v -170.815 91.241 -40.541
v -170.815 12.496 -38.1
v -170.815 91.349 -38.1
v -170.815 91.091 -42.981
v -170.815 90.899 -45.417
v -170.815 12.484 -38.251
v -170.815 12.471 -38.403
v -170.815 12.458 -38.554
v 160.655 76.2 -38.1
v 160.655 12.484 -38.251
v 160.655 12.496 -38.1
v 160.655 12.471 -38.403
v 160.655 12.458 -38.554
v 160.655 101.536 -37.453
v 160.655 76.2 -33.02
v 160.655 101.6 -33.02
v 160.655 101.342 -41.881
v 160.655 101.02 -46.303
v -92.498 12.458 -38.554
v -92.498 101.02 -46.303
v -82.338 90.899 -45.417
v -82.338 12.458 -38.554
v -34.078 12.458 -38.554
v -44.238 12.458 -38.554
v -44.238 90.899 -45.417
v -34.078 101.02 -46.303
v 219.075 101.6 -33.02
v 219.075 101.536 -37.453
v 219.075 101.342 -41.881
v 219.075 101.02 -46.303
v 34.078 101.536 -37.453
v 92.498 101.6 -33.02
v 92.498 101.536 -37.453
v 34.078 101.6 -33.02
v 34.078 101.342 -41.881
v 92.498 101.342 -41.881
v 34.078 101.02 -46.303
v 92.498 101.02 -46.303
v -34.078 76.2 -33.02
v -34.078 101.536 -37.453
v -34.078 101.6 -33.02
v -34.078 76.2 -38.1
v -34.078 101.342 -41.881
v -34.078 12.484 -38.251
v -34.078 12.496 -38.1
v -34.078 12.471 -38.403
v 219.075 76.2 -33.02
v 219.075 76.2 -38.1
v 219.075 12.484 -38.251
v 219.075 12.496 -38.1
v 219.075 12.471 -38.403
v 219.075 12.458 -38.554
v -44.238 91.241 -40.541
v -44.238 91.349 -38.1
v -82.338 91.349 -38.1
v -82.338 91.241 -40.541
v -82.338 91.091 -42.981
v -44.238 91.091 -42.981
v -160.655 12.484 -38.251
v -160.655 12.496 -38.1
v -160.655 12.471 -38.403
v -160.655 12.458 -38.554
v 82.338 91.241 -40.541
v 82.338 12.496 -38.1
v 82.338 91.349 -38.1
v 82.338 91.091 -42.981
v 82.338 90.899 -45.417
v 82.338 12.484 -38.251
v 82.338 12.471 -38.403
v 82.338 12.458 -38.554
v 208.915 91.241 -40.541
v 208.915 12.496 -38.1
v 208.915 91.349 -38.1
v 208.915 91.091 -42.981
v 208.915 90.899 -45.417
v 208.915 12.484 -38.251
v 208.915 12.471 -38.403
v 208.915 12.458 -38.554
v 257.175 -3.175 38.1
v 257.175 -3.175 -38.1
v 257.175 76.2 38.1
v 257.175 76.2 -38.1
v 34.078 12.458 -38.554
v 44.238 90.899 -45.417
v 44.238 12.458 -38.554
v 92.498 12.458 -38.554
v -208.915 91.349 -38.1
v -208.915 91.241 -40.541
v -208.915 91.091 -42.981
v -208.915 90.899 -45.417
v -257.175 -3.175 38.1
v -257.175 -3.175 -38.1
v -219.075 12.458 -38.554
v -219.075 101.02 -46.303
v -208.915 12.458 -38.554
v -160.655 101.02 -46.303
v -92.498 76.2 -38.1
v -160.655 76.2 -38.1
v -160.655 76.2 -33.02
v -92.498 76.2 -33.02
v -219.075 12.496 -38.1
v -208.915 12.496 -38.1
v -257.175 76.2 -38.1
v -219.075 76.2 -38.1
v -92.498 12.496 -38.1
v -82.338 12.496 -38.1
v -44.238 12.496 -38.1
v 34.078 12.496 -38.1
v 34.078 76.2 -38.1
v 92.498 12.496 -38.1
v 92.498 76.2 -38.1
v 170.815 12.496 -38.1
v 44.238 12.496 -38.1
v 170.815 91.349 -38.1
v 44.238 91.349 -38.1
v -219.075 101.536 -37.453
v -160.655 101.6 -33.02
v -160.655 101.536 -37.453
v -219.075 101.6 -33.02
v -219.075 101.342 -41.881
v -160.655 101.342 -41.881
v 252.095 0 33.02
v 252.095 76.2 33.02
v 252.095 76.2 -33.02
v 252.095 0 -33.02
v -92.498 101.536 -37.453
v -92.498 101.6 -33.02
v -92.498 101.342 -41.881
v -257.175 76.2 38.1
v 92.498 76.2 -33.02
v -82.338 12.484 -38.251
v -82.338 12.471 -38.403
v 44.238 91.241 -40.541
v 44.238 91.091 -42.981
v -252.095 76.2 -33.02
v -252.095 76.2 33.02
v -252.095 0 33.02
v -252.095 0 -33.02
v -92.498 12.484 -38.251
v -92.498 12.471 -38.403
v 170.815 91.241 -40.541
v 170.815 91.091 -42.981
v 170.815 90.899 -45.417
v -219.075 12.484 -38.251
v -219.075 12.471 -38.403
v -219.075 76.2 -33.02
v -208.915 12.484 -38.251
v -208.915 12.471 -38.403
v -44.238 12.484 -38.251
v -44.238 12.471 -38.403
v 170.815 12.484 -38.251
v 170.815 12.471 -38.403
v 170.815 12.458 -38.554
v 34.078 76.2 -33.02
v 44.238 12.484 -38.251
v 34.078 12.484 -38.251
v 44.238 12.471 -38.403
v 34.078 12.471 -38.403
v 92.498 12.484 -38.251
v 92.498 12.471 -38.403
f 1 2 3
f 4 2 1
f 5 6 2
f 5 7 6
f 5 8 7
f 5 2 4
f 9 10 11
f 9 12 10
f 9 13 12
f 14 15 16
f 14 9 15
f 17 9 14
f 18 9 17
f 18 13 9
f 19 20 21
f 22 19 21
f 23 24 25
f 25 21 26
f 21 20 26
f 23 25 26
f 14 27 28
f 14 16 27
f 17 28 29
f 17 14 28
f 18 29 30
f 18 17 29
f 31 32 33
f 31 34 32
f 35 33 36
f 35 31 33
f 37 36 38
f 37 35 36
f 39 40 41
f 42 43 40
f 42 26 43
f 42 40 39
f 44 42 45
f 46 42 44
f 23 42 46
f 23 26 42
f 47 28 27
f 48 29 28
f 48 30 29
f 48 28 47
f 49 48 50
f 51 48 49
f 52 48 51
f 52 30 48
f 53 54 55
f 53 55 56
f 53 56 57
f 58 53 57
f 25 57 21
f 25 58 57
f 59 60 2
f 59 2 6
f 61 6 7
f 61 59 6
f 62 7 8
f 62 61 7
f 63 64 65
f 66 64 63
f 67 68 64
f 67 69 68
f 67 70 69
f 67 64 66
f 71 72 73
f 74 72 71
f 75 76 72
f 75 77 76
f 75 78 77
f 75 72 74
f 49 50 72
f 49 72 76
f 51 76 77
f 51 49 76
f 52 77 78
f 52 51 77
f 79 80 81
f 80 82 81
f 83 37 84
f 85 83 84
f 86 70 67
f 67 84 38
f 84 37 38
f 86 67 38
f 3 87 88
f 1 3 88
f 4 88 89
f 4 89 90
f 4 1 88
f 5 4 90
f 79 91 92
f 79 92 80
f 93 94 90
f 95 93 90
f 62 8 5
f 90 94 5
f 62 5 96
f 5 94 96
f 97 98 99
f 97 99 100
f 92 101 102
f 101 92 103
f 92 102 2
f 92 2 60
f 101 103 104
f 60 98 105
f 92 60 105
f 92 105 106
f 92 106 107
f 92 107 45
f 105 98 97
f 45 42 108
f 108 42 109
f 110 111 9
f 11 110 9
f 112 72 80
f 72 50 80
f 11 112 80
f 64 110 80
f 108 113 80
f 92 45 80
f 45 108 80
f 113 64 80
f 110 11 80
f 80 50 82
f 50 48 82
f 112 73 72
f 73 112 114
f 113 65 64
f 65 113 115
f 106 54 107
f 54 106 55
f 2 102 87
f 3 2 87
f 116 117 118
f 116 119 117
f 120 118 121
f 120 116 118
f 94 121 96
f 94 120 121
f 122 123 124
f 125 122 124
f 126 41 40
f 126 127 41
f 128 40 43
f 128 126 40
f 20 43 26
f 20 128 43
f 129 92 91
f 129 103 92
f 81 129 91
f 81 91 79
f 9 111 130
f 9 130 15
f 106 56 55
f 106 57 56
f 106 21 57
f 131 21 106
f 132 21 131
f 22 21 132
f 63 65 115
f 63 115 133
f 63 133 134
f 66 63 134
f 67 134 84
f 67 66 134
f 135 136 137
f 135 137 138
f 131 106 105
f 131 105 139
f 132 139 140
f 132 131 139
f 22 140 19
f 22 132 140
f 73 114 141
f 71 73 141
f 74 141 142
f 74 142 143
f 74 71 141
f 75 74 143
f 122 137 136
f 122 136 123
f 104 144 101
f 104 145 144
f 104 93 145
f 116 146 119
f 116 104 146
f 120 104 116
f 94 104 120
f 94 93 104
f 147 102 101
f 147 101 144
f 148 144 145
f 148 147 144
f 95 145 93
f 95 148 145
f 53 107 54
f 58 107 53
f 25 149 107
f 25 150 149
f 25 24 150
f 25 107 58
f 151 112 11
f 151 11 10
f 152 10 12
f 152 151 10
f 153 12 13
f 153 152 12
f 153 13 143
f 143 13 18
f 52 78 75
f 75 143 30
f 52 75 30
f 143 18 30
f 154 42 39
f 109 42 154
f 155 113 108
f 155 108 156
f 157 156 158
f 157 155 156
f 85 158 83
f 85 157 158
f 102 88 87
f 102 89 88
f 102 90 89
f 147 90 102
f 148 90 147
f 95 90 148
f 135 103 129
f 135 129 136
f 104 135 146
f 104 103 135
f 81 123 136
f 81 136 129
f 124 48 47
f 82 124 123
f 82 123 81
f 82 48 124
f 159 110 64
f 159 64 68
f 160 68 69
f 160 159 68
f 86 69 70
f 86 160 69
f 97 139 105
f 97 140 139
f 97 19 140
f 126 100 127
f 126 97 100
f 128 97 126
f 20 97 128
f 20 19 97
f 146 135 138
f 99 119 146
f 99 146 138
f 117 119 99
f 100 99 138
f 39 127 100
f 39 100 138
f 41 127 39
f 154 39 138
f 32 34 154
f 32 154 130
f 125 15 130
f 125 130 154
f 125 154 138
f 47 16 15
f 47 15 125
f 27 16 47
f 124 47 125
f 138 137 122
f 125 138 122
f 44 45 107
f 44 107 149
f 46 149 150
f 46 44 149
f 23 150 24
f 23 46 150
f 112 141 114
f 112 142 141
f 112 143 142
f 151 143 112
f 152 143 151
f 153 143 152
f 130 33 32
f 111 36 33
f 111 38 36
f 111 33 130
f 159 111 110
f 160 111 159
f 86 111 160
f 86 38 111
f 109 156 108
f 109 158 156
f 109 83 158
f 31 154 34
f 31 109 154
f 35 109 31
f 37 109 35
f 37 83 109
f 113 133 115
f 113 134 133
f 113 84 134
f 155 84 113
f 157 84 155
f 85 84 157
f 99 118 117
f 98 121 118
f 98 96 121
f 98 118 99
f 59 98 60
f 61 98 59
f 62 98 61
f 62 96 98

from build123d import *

# Parameters (mm, degrees)
SKETCH1_W           = 514.35
SKETCH1_H           = 76.2
SKETCH1_W_2         = 504.19
SKETCH1_H_2         = 66.04
BOSS_EXTRUDE1_DEPTH = 76.2
REVOLVE1_ANGLE      = 5
SKETCH3_W           = 38.1
SKETCH3_H           = 15.24
BOSS_EXTRUDE2_DEPTH = 5.08
SKETCH4_W           = 514.35
SKETCH4_H           = 76.2
BOSS_EXTRUDE3_DEPTH = 3.175


with BuildPart() as part:
    # Sketch1 → Boss-Extrude1 (new body)
    with BuildSketch(Plane(origin=(0, 0, 0), x_dir=(1, 0, 0), z_dir=(0, 1, 0))):
        Rectangle(SKETCH1_W, SKETCH1_H)
        Rectangle(SKETCH1_W_2, SKETCH1_H_2, mode=Mode.SUBTRACT)
    extrude(amount=BOSS_EXTRUDE1_DEPTH)

    # Sketch2 → Revolve1 (revolve)
    with BuildSketch(Plane(origin=(0, 0, -33.02), x_dir=(-1, 0, 0), z_dir=(0, 0, -1))):
        Polygon((-219.075, 12.7), (-219.075, 101.6), (-160.655, 101.6), (-160.655, 12.7), (-170.815, 12.7), (-170.815, 91.44), (-208.915, 91.44), (-208.915, 12.7), align=None)
        Polygon((-82.338333333, 12.7), (-92.498333333, 12.7), (-92.498333333, 101.6), (-34.078333333, 101.6), (-34.078333333, 12.7), (-44.238333333, 12.7), (-44.238333333, 91.44), (-82.338333333, 91.44), align=None)
        Polygon((44.238333333, 12.7), (34.078333333, 12.7), (34.078333333, 101.6), (92.498333333, 101.6), (92.498333333, 12.7), (82.338333333, 12.7), (82.338333333, 91.44), (44.238333333, 91.44), align=None)
        Polygon((170.815, 12.7), (160.655, 12.7), (160.655, 101.6), (219.075, 101.6), (219.075, 12.7), (208.915, 12.7), (208.915, 91.44), (170.815, 91.44), align=None)
    revolve(axis=Axis((275.97212821, -50.8, -33.02), (-1, 0, 0)), revolution_arc=REVOLVE1_ANGLE)

    # Sketch3 → Boss-Extrude2 (add)
    with BuildSketch(Plane.XY.offset(-33.02)):
        with Locations((-189.865, 83.82)):
            Rectangle(SKETCH3_W, SKETCH3_H)
        with Locations((-63.288333333, 83.82)):
            Rectangle(SKETCH3_W, SKETCH3_H)
        with Locations((63.288333333, 83.82)):
            Rectangle(SKETCH3_W, SKETCH3_H)
        with Locations((189.865, 83.82)):
            Rectangle(SKETCH3_W, SKETCH3_H)
    extrude(amount=-BOSS_EXTRUDE2_DEPTH)

    # Sketch4 → Boss-Extrude3 (add)
    with BuildSketch(Plane.XZ):
        Rectangle(SKETCH4_W, SKETCH4_H)
    extrude(amount=BOSS_EXTRUDE3_DEPTH)


solid = part.part
